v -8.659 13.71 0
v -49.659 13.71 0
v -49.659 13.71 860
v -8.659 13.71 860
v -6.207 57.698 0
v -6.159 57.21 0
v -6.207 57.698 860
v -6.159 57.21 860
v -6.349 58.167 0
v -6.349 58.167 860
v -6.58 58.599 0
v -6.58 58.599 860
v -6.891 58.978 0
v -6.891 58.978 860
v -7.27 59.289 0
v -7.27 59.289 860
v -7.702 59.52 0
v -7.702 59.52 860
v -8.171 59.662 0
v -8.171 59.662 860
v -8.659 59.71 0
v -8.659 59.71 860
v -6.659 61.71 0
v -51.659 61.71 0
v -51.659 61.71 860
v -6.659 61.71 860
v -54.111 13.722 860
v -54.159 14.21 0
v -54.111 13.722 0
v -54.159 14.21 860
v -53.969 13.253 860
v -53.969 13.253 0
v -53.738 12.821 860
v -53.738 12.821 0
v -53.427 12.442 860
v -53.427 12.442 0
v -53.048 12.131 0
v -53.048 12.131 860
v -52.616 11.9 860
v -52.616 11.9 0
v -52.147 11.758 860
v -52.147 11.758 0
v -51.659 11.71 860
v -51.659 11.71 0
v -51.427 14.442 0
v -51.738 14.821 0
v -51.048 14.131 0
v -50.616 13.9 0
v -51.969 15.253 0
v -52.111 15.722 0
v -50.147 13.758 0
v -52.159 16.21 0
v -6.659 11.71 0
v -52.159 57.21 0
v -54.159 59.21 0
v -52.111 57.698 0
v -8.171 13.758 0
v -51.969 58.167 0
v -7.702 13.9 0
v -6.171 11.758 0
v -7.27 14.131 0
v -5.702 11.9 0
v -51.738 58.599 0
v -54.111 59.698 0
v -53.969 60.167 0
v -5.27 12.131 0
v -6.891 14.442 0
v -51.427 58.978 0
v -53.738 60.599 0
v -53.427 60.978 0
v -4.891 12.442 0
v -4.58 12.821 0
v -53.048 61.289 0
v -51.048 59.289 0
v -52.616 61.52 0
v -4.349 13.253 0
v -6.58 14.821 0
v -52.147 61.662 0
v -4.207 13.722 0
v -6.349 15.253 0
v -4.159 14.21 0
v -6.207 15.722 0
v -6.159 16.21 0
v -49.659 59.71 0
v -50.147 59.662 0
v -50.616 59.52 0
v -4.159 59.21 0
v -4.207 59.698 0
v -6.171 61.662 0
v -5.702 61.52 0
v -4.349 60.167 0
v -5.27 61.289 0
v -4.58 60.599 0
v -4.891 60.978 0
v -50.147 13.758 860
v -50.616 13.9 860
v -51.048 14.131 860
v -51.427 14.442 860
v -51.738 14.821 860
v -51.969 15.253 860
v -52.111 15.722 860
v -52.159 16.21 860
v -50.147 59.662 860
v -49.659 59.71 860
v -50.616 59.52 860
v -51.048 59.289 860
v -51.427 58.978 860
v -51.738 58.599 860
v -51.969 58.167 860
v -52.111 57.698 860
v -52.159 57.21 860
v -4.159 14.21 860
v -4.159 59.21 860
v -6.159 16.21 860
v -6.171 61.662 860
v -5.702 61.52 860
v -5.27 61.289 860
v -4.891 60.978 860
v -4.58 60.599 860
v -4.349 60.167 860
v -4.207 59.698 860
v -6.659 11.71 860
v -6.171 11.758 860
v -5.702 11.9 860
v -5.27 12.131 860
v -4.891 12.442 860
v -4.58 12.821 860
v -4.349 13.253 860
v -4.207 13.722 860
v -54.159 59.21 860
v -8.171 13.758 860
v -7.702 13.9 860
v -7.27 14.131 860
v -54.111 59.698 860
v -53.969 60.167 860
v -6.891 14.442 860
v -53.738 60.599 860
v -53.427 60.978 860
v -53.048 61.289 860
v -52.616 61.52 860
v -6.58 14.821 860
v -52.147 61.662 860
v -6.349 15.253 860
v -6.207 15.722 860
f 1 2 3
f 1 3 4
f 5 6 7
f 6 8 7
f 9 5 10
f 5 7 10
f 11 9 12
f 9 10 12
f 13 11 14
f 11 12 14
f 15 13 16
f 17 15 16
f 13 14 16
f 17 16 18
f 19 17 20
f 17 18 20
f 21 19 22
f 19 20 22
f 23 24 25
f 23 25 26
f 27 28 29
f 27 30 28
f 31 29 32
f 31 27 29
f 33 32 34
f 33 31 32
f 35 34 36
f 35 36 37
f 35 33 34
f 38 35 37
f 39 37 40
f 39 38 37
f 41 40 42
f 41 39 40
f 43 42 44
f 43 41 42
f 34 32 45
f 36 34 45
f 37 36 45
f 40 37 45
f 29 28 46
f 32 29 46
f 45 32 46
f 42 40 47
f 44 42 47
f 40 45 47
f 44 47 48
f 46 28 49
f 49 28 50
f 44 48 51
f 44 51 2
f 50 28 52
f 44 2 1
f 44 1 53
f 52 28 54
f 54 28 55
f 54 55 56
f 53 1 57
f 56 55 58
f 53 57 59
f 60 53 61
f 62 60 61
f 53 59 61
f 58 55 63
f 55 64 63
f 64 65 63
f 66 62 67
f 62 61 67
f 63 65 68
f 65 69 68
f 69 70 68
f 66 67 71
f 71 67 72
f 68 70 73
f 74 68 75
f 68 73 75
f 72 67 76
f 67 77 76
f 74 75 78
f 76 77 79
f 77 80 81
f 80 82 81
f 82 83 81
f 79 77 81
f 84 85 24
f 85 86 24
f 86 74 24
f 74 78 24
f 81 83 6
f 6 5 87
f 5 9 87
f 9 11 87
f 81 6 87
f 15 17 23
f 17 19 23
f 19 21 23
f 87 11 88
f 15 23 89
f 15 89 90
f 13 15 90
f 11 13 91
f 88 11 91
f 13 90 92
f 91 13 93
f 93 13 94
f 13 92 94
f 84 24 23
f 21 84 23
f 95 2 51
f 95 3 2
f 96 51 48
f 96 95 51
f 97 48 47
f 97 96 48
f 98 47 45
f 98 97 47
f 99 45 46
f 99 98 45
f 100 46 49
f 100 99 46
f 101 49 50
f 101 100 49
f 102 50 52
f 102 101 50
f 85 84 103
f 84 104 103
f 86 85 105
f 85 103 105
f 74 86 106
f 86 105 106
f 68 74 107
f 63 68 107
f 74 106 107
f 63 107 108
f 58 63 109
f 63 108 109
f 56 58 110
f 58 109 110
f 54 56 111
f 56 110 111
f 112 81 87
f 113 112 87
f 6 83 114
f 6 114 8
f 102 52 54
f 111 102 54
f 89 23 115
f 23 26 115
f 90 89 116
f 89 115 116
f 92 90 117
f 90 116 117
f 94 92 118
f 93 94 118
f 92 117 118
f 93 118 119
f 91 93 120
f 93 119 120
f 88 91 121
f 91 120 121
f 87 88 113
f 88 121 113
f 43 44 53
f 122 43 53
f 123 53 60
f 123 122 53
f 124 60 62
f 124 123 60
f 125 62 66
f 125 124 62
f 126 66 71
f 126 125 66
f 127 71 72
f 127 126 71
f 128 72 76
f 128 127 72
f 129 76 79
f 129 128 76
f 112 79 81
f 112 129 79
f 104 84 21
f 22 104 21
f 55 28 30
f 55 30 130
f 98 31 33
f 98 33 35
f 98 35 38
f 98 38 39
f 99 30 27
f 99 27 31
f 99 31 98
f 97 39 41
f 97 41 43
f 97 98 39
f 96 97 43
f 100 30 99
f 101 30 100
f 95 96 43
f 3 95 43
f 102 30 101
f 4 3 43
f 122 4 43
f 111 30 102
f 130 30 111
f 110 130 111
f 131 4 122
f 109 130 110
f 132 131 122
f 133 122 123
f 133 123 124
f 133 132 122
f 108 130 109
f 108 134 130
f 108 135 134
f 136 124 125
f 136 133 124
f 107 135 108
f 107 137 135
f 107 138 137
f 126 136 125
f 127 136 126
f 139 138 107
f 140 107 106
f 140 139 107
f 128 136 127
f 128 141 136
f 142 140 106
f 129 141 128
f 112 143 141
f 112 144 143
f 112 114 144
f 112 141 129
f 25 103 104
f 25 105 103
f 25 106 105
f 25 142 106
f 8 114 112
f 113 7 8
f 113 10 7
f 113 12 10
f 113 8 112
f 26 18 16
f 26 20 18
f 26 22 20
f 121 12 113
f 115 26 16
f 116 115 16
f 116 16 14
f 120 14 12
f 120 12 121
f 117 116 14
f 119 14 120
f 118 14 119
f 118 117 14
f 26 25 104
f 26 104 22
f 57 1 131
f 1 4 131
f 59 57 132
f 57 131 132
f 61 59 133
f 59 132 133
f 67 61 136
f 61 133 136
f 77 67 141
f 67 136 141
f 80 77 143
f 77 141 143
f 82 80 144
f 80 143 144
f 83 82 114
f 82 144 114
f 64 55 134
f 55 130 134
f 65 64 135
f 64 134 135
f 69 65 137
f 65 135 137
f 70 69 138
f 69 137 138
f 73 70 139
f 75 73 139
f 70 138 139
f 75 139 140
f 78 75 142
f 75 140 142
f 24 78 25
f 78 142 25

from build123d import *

# Parameters (mm, degrees)
F0_W     = 50
F0_H     = 50
F0_W_2   = 46
F0_H_2   = 46
F1_DEPTH = 860
F2_R     = 2.5
F3_R     = 2.5


with BuildPart() as f1:
    # F0 (on Top) → F1 (new body)
    with BuildSketch(Plane.XY):
        with Locations((-29.158926, 36.710037)):
            Rectangle(F0_W, F0_H)
        with Locations((-29.158926, 36.710037)):
            Rectangle(F0_W_2, F0_H_2, mode=Mode.SUBTRACT)
    extrude(amount=F1_DEPTH)

    # F2
    f2_edges = [f1.edges().sort_by_distance(p)[0] for p in [
        (-4.158926, 61.710037, 430),
        (-54.158926, 61.710037, 430),
        (-4.158926, 11.710037, 430),
        (-54.158926, 11.710037, 430),
    ]]
    fillet(f2_edges, radius=F2_R)

    # F3
    f3_edges = [f1.edges().sort_by_distance(p)[0] for p in [
        (-6.158926, 59.710037, 430),
        (-52.158926, 59.710037, 430),
        (-52.158926, 13.710037, 430),
        (-6.158926, 13.710037, 430),
    ]]
    fillet(f3_edges, radius=F3_R)


with BuildPart() as f4_1:
    # F4: copy of F1
    add(f1.part)


with BuildPart() as f6_1:
    # F6: copy of F1
    add(f1.part)


solid = f1.part
